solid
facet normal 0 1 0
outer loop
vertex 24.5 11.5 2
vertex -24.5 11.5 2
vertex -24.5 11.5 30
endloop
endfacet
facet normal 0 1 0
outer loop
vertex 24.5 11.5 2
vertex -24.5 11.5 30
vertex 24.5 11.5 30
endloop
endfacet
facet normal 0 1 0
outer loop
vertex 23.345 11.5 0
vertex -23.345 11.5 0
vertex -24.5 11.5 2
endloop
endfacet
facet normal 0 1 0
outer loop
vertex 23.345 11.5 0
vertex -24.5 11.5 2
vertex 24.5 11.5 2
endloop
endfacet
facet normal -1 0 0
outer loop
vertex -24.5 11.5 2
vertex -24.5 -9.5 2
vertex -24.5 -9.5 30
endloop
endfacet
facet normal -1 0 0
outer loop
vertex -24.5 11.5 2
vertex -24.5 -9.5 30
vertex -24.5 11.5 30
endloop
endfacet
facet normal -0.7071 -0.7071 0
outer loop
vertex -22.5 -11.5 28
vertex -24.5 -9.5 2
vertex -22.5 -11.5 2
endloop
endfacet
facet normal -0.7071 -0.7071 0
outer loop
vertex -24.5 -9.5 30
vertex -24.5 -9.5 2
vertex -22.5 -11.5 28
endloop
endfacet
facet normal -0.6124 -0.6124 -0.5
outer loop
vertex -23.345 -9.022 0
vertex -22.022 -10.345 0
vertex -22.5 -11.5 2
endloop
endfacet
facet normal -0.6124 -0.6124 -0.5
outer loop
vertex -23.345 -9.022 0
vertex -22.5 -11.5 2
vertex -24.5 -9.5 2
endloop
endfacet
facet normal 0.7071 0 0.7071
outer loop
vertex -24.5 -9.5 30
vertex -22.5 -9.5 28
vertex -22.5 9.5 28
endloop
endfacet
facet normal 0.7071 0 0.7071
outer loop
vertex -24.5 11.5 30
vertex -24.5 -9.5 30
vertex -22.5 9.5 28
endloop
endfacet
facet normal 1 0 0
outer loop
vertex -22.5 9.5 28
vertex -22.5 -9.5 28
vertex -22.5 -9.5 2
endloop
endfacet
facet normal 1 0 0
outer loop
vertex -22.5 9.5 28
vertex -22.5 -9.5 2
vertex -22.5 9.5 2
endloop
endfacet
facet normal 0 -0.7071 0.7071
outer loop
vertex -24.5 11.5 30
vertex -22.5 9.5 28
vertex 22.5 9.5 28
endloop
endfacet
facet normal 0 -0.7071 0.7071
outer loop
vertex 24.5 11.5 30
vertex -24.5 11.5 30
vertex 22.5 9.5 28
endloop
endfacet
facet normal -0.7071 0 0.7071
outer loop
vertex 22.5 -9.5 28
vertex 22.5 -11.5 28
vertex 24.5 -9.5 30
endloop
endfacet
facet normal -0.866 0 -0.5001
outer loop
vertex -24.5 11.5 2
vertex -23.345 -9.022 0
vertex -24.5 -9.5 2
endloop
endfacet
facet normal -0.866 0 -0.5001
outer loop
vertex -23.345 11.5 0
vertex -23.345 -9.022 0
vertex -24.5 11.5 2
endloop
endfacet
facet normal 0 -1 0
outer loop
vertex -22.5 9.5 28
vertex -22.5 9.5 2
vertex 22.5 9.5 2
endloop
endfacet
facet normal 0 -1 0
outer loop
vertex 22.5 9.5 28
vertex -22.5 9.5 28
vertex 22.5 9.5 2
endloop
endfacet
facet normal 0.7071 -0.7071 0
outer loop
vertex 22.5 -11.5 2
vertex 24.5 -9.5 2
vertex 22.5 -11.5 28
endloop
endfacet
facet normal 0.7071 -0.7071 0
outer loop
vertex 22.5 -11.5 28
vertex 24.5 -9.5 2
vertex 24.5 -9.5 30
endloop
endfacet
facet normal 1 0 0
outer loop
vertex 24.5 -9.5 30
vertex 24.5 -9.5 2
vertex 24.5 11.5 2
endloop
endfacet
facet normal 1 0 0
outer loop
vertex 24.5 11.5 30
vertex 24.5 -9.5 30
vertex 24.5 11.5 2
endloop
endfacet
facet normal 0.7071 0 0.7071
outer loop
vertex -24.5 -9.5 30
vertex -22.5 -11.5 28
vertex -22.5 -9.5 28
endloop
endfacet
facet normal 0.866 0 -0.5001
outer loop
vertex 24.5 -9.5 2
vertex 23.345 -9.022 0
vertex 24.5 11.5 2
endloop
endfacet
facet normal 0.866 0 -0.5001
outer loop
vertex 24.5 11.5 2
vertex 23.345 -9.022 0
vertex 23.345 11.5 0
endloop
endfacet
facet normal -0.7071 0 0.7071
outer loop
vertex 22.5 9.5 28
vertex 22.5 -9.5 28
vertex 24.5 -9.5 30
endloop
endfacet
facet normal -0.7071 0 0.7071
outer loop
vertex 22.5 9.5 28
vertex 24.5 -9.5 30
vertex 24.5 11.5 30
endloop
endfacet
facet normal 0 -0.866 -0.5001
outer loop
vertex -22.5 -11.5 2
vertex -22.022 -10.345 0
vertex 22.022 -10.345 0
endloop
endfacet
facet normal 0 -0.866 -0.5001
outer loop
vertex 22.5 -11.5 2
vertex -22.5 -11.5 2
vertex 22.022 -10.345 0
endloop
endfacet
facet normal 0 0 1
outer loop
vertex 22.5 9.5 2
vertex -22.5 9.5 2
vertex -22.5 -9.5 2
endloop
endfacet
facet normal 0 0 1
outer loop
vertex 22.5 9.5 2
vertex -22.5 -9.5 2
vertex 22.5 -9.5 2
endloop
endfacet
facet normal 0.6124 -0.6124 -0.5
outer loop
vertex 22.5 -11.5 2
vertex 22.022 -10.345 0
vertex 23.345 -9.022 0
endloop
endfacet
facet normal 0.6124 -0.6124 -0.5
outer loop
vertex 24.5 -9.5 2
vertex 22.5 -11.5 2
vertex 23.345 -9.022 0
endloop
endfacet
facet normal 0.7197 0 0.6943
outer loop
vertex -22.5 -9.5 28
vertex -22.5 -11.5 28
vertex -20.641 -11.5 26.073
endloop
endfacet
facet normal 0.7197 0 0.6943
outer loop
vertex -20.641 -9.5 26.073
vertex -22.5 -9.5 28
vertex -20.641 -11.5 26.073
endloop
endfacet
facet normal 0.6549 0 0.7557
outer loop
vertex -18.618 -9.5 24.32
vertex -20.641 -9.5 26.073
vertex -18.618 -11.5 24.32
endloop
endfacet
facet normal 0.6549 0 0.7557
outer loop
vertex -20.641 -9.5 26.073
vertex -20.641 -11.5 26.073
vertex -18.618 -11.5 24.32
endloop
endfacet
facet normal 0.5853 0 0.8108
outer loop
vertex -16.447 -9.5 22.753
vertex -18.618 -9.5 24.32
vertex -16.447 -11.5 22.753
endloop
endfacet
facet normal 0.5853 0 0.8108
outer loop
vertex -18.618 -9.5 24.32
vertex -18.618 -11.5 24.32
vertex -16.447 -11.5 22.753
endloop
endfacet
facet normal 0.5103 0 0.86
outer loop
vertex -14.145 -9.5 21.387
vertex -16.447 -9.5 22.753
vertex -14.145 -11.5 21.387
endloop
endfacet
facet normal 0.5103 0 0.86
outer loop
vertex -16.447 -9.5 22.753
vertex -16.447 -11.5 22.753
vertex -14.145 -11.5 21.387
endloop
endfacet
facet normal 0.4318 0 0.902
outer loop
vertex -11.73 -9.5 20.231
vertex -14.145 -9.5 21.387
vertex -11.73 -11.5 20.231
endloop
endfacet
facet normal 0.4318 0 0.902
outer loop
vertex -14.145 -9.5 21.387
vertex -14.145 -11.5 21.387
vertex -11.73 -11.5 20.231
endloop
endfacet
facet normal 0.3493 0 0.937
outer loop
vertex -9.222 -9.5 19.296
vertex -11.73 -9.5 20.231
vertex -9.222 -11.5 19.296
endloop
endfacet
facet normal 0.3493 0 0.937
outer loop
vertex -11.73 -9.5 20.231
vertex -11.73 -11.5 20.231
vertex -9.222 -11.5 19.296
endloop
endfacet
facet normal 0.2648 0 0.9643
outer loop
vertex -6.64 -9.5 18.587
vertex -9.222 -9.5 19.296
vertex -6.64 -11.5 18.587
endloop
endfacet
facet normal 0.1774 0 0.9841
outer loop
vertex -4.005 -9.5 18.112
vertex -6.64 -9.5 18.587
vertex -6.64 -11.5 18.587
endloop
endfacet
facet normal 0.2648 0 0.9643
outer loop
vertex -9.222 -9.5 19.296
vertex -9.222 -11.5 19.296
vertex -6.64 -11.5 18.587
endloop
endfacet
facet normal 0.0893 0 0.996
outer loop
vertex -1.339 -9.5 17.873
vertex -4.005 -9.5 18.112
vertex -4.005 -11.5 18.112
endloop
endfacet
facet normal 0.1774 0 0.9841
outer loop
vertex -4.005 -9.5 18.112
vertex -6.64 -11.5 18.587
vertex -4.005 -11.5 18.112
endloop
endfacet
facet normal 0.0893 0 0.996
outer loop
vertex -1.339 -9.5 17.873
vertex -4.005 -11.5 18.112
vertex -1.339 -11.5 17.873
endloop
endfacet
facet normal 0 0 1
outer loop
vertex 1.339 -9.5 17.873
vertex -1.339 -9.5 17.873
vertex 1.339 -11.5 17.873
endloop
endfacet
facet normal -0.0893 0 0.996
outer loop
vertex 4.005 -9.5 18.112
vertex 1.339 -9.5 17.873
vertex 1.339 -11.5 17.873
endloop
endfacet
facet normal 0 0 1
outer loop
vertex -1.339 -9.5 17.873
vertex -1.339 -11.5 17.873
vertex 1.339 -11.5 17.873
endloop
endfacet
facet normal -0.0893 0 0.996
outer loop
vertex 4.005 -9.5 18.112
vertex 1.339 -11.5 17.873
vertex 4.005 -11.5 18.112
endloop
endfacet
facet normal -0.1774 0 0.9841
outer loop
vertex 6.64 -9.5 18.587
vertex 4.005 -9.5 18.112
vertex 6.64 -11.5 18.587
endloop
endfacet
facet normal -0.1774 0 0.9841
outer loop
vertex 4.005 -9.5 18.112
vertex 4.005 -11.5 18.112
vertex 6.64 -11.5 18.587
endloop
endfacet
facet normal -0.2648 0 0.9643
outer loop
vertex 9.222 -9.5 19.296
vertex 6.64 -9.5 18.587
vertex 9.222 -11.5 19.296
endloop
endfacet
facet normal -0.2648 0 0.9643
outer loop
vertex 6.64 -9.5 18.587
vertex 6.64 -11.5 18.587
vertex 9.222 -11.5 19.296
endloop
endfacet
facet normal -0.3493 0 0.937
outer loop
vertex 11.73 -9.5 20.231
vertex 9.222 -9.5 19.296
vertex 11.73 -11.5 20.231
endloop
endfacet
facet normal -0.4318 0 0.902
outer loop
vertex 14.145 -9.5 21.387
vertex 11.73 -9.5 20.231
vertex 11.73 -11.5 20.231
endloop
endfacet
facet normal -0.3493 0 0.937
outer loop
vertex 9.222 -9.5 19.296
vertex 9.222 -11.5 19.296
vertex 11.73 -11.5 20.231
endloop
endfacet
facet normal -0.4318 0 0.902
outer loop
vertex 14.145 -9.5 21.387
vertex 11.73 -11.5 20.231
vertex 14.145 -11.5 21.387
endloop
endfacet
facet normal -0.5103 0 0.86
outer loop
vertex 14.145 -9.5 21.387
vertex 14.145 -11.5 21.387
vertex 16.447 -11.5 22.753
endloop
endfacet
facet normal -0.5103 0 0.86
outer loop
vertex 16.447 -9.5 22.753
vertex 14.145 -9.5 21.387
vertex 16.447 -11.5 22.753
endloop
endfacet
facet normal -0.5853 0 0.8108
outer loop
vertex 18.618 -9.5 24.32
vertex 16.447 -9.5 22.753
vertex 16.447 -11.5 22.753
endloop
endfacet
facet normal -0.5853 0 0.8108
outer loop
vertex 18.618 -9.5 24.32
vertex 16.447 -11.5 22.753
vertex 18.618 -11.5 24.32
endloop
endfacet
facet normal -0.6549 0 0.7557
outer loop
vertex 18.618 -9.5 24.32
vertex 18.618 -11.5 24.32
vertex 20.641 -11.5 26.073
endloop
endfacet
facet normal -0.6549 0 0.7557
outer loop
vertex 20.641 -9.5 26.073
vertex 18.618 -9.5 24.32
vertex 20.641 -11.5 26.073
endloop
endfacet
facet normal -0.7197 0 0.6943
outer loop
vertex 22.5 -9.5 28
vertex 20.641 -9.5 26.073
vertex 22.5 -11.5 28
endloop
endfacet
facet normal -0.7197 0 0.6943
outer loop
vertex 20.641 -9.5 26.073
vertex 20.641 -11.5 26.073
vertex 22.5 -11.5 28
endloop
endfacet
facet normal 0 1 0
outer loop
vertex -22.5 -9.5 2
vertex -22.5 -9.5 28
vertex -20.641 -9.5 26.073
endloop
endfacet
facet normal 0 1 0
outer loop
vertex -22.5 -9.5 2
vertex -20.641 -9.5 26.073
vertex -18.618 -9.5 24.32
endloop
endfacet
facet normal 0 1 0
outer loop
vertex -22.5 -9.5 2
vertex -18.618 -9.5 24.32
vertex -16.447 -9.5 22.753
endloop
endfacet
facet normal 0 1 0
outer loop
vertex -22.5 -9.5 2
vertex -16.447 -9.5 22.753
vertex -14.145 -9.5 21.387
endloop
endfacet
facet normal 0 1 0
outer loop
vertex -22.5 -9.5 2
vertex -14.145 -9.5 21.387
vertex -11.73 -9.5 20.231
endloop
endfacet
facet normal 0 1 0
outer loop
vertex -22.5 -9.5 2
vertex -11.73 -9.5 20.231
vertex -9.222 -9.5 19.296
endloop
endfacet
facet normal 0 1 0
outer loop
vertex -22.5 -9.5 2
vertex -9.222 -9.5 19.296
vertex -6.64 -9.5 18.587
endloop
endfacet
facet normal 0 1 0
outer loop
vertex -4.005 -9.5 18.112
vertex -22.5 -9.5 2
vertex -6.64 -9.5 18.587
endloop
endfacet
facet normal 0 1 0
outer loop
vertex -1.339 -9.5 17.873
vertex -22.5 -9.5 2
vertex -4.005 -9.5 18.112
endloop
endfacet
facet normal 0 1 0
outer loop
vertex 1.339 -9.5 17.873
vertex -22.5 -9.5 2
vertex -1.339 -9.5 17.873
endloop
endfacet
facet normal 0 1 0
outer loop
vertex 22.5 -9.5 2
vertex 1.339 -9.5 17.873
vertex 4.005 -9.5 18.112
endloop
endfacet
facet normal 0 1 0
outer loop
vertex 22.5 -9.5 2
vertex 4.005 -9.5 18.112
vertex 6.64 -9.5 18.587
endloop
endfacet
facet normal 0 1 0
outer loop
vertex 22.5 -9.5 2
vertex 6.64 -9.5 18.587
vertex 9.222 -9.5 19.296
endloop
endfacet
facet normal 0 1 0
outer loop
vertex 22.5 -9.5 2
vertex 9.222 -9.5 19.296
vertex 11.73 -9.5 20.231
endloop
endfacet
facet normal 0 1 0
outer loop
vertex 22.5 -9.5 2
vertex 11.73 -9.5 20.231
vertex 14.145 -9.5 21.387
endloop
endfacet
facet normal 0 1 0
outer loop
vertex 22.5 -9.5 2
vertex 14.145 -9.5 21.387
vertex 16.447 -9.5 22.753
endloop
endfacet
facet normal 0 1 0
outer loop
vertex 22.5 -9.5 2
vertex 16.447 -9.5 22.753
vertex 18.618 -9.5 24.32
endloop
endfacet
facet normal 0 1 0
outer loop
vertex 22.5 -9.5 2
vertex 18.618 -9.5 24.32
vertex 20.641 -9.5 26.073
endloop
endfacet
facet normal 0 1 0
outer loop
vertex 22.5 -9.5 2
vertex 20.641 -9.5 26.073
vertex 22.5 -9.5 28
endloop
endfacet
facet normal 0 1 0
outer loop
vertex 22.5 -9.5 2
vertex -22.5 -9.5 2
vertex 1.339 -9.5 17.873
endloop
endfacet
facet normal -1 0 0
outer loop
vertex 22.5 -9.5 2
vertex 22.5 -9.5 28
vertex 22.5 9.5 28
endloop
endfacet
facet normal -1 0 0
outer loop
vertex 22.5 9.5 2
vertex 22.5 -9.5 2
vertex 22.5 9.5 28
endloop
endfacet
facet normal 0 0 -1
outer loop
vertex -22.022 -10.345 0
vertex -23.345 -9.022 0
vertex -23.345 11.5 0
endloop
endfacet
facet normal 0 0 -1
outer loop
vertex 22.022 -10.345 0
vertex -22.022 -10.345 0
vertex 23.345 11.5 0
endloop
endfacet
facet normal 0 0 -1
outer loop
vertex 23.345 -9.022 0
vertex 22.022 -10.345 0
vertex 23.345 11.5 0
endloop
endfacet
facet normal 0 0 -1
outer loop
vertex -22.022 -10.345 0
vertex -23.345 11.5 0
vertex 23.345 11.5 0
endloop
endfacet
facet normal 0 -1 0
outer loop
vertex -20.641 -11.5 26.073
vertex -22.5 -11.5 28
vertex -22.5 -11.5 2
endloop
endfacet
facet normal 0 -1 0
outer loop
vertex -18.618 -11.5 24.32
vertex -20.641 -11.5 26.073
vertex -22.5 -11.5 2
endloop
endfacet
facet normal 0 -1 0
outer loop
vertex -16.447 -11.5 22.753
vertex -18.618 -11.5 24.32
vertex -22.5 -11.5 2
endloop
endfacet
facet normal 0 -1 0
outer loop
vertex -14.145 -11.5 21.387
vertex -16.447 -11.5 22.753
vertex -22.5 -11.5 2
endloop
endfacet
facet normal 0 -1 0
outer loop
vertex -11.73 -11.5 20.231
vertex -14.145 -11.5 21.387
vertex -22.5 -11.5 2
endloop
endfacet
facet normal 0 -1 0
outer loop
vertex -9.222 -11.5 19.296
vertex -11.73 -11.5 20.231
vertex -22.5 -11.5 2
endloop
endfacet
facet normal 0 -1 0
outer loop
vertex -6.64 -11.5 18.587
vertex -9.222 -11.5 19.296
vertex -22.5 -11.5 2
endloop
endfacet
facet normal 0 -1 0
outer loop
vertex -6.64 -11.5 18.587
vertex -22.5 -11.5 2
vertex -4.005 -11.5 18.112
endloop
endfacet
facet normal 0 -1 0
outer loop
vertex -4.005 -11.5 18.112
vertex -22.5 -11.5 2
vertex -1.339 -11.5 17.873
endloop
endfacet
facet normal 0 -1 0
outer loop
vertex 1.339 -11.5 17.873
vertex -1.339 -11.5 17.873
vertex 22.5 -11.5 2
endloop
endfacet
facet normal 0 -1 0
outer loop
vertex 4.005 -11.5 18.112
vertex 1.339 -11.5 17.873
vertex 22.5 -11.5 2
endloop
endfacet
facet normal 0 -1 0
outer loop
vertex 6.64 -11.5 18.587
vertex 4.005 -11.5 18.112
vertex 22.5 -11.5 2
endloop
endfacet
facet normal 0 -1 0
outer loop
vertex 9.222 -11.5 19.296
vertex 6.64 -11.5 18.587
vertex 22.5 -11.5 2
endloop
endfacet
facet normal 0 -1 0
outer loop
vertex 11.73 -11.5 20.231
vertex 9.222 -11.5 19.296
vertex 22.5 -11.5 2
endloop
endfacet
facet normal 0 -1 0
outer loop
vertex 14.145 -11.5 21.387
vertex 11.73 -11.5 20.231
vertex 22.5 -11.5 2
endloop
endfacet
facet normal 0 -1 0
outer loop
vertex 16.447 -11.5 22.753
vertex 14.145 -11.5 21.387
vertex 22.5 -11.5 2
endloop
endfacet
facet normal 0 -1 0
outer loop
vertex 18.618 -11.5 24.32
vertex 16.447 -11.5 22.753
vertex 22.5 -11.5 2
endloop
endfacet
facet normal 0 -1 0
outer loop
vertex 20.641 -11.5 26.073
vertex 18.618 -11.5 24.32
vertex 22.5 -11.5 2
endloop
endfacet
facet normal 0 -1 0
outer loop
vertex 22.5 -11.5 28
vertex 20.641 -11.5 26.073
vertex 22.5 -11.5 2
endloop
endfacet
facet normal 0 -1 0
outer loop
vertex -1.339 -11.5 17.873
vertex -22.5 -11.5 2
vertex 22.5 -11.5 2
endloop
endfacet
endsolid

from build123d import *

# Parameters (mm, degrees)
F0_W     = 49
F0_H     = 23
F1_DEPTH = 30
F2_T     = -2
F3_SIZE  = 1.99999
F5_DEPTH = 2
F6_SIZE  = 1.9999
F7_SIZE  = 1.99999
F8_SIZE2 = 1.1547005384
F8_SIZE  = 2


# Not quite as in the source:
# - a fillet or chamfer is up to 0.001 mm smaller than in the source, because OpenCascade refuses the exact size


with BuildPart() as f1:
    # F0 (on Top) → F1 (new body)
    with BuildSketch(Plane.XY):
        Rectangle(F0_W, F0_H)
    extrude(amount=F1_DEPTH)

    # F2
    f2_openings = [f1.faces().sort_by_distance(p)[0] for p in [
        (0, 0, 30),
    ]]
    offset(amount=F2_T, openings=f2_openings)

    # F3 (size 2 in the source; OpenCascade refuses exactly that, so slightly less here)
    f3_edges = [f1.edges().sort_by_distance(p)[0] for p in [
        (0, 9.5, 30),
        (-22.5, 0, 30),
        (22.5, 0, 30),
    ]]
    chamfer(f3_edges, length=F3_SIZE)

    # F4 (on face) → F5 (cut, through all)
    with BuildSketch(Plane.XZ.offset(11.5)):
        with BuildLine():
            Line((-22.5, 30), (-22.5, 28))
            ThreePointArc((-22.5, 28), (0, 17.843134833), (22.5, 28))
            Line((22.5, 28), (22.5, 30))
            Line((22.5, 30), (-22.5, 30))
        make_face()
    extrude(amount=-F5_DEPTH, mode=Mode.SUBTRACT)

    # F6 (size 2 in the source; OpenCascade refuses exactly that, so slightly less here)
    f6_edges = [f1.edges().sort_by_distance(p)[0] for p in [
        (-22.5, -10.5, 30),
        (22.5, -10.5, 30),
    ]]
    chamfer(f6_edges, length=F6_SIZE)

    # F7 (size 2 in the source; OpenCascade refuses exactly that, so slightly less here)
    f7_edges = [f1.edges().sort_by_distance(p)[0] for p in [
        (-24.5, -11.5, 15),
        (24.5, -11.5, 15),
    ]]
    chamfer(f7_edges, length=F7_SIZE)

    # F8
    f8_edges = [f1.edges().sort_by_distance(p)[0] for p in [
        (24.5, 0.999995, 0),
        (23.500005, -10.500005, 0),
        (0, -11.5, 0),
        (-23.500005, -10.500005, 0),
        (-24.5, 0.999995, 0),
    ]]
    chamfer(f8_edges, length=F8_SIZE, length2=F8_SIZE2)


solid = f1.part
